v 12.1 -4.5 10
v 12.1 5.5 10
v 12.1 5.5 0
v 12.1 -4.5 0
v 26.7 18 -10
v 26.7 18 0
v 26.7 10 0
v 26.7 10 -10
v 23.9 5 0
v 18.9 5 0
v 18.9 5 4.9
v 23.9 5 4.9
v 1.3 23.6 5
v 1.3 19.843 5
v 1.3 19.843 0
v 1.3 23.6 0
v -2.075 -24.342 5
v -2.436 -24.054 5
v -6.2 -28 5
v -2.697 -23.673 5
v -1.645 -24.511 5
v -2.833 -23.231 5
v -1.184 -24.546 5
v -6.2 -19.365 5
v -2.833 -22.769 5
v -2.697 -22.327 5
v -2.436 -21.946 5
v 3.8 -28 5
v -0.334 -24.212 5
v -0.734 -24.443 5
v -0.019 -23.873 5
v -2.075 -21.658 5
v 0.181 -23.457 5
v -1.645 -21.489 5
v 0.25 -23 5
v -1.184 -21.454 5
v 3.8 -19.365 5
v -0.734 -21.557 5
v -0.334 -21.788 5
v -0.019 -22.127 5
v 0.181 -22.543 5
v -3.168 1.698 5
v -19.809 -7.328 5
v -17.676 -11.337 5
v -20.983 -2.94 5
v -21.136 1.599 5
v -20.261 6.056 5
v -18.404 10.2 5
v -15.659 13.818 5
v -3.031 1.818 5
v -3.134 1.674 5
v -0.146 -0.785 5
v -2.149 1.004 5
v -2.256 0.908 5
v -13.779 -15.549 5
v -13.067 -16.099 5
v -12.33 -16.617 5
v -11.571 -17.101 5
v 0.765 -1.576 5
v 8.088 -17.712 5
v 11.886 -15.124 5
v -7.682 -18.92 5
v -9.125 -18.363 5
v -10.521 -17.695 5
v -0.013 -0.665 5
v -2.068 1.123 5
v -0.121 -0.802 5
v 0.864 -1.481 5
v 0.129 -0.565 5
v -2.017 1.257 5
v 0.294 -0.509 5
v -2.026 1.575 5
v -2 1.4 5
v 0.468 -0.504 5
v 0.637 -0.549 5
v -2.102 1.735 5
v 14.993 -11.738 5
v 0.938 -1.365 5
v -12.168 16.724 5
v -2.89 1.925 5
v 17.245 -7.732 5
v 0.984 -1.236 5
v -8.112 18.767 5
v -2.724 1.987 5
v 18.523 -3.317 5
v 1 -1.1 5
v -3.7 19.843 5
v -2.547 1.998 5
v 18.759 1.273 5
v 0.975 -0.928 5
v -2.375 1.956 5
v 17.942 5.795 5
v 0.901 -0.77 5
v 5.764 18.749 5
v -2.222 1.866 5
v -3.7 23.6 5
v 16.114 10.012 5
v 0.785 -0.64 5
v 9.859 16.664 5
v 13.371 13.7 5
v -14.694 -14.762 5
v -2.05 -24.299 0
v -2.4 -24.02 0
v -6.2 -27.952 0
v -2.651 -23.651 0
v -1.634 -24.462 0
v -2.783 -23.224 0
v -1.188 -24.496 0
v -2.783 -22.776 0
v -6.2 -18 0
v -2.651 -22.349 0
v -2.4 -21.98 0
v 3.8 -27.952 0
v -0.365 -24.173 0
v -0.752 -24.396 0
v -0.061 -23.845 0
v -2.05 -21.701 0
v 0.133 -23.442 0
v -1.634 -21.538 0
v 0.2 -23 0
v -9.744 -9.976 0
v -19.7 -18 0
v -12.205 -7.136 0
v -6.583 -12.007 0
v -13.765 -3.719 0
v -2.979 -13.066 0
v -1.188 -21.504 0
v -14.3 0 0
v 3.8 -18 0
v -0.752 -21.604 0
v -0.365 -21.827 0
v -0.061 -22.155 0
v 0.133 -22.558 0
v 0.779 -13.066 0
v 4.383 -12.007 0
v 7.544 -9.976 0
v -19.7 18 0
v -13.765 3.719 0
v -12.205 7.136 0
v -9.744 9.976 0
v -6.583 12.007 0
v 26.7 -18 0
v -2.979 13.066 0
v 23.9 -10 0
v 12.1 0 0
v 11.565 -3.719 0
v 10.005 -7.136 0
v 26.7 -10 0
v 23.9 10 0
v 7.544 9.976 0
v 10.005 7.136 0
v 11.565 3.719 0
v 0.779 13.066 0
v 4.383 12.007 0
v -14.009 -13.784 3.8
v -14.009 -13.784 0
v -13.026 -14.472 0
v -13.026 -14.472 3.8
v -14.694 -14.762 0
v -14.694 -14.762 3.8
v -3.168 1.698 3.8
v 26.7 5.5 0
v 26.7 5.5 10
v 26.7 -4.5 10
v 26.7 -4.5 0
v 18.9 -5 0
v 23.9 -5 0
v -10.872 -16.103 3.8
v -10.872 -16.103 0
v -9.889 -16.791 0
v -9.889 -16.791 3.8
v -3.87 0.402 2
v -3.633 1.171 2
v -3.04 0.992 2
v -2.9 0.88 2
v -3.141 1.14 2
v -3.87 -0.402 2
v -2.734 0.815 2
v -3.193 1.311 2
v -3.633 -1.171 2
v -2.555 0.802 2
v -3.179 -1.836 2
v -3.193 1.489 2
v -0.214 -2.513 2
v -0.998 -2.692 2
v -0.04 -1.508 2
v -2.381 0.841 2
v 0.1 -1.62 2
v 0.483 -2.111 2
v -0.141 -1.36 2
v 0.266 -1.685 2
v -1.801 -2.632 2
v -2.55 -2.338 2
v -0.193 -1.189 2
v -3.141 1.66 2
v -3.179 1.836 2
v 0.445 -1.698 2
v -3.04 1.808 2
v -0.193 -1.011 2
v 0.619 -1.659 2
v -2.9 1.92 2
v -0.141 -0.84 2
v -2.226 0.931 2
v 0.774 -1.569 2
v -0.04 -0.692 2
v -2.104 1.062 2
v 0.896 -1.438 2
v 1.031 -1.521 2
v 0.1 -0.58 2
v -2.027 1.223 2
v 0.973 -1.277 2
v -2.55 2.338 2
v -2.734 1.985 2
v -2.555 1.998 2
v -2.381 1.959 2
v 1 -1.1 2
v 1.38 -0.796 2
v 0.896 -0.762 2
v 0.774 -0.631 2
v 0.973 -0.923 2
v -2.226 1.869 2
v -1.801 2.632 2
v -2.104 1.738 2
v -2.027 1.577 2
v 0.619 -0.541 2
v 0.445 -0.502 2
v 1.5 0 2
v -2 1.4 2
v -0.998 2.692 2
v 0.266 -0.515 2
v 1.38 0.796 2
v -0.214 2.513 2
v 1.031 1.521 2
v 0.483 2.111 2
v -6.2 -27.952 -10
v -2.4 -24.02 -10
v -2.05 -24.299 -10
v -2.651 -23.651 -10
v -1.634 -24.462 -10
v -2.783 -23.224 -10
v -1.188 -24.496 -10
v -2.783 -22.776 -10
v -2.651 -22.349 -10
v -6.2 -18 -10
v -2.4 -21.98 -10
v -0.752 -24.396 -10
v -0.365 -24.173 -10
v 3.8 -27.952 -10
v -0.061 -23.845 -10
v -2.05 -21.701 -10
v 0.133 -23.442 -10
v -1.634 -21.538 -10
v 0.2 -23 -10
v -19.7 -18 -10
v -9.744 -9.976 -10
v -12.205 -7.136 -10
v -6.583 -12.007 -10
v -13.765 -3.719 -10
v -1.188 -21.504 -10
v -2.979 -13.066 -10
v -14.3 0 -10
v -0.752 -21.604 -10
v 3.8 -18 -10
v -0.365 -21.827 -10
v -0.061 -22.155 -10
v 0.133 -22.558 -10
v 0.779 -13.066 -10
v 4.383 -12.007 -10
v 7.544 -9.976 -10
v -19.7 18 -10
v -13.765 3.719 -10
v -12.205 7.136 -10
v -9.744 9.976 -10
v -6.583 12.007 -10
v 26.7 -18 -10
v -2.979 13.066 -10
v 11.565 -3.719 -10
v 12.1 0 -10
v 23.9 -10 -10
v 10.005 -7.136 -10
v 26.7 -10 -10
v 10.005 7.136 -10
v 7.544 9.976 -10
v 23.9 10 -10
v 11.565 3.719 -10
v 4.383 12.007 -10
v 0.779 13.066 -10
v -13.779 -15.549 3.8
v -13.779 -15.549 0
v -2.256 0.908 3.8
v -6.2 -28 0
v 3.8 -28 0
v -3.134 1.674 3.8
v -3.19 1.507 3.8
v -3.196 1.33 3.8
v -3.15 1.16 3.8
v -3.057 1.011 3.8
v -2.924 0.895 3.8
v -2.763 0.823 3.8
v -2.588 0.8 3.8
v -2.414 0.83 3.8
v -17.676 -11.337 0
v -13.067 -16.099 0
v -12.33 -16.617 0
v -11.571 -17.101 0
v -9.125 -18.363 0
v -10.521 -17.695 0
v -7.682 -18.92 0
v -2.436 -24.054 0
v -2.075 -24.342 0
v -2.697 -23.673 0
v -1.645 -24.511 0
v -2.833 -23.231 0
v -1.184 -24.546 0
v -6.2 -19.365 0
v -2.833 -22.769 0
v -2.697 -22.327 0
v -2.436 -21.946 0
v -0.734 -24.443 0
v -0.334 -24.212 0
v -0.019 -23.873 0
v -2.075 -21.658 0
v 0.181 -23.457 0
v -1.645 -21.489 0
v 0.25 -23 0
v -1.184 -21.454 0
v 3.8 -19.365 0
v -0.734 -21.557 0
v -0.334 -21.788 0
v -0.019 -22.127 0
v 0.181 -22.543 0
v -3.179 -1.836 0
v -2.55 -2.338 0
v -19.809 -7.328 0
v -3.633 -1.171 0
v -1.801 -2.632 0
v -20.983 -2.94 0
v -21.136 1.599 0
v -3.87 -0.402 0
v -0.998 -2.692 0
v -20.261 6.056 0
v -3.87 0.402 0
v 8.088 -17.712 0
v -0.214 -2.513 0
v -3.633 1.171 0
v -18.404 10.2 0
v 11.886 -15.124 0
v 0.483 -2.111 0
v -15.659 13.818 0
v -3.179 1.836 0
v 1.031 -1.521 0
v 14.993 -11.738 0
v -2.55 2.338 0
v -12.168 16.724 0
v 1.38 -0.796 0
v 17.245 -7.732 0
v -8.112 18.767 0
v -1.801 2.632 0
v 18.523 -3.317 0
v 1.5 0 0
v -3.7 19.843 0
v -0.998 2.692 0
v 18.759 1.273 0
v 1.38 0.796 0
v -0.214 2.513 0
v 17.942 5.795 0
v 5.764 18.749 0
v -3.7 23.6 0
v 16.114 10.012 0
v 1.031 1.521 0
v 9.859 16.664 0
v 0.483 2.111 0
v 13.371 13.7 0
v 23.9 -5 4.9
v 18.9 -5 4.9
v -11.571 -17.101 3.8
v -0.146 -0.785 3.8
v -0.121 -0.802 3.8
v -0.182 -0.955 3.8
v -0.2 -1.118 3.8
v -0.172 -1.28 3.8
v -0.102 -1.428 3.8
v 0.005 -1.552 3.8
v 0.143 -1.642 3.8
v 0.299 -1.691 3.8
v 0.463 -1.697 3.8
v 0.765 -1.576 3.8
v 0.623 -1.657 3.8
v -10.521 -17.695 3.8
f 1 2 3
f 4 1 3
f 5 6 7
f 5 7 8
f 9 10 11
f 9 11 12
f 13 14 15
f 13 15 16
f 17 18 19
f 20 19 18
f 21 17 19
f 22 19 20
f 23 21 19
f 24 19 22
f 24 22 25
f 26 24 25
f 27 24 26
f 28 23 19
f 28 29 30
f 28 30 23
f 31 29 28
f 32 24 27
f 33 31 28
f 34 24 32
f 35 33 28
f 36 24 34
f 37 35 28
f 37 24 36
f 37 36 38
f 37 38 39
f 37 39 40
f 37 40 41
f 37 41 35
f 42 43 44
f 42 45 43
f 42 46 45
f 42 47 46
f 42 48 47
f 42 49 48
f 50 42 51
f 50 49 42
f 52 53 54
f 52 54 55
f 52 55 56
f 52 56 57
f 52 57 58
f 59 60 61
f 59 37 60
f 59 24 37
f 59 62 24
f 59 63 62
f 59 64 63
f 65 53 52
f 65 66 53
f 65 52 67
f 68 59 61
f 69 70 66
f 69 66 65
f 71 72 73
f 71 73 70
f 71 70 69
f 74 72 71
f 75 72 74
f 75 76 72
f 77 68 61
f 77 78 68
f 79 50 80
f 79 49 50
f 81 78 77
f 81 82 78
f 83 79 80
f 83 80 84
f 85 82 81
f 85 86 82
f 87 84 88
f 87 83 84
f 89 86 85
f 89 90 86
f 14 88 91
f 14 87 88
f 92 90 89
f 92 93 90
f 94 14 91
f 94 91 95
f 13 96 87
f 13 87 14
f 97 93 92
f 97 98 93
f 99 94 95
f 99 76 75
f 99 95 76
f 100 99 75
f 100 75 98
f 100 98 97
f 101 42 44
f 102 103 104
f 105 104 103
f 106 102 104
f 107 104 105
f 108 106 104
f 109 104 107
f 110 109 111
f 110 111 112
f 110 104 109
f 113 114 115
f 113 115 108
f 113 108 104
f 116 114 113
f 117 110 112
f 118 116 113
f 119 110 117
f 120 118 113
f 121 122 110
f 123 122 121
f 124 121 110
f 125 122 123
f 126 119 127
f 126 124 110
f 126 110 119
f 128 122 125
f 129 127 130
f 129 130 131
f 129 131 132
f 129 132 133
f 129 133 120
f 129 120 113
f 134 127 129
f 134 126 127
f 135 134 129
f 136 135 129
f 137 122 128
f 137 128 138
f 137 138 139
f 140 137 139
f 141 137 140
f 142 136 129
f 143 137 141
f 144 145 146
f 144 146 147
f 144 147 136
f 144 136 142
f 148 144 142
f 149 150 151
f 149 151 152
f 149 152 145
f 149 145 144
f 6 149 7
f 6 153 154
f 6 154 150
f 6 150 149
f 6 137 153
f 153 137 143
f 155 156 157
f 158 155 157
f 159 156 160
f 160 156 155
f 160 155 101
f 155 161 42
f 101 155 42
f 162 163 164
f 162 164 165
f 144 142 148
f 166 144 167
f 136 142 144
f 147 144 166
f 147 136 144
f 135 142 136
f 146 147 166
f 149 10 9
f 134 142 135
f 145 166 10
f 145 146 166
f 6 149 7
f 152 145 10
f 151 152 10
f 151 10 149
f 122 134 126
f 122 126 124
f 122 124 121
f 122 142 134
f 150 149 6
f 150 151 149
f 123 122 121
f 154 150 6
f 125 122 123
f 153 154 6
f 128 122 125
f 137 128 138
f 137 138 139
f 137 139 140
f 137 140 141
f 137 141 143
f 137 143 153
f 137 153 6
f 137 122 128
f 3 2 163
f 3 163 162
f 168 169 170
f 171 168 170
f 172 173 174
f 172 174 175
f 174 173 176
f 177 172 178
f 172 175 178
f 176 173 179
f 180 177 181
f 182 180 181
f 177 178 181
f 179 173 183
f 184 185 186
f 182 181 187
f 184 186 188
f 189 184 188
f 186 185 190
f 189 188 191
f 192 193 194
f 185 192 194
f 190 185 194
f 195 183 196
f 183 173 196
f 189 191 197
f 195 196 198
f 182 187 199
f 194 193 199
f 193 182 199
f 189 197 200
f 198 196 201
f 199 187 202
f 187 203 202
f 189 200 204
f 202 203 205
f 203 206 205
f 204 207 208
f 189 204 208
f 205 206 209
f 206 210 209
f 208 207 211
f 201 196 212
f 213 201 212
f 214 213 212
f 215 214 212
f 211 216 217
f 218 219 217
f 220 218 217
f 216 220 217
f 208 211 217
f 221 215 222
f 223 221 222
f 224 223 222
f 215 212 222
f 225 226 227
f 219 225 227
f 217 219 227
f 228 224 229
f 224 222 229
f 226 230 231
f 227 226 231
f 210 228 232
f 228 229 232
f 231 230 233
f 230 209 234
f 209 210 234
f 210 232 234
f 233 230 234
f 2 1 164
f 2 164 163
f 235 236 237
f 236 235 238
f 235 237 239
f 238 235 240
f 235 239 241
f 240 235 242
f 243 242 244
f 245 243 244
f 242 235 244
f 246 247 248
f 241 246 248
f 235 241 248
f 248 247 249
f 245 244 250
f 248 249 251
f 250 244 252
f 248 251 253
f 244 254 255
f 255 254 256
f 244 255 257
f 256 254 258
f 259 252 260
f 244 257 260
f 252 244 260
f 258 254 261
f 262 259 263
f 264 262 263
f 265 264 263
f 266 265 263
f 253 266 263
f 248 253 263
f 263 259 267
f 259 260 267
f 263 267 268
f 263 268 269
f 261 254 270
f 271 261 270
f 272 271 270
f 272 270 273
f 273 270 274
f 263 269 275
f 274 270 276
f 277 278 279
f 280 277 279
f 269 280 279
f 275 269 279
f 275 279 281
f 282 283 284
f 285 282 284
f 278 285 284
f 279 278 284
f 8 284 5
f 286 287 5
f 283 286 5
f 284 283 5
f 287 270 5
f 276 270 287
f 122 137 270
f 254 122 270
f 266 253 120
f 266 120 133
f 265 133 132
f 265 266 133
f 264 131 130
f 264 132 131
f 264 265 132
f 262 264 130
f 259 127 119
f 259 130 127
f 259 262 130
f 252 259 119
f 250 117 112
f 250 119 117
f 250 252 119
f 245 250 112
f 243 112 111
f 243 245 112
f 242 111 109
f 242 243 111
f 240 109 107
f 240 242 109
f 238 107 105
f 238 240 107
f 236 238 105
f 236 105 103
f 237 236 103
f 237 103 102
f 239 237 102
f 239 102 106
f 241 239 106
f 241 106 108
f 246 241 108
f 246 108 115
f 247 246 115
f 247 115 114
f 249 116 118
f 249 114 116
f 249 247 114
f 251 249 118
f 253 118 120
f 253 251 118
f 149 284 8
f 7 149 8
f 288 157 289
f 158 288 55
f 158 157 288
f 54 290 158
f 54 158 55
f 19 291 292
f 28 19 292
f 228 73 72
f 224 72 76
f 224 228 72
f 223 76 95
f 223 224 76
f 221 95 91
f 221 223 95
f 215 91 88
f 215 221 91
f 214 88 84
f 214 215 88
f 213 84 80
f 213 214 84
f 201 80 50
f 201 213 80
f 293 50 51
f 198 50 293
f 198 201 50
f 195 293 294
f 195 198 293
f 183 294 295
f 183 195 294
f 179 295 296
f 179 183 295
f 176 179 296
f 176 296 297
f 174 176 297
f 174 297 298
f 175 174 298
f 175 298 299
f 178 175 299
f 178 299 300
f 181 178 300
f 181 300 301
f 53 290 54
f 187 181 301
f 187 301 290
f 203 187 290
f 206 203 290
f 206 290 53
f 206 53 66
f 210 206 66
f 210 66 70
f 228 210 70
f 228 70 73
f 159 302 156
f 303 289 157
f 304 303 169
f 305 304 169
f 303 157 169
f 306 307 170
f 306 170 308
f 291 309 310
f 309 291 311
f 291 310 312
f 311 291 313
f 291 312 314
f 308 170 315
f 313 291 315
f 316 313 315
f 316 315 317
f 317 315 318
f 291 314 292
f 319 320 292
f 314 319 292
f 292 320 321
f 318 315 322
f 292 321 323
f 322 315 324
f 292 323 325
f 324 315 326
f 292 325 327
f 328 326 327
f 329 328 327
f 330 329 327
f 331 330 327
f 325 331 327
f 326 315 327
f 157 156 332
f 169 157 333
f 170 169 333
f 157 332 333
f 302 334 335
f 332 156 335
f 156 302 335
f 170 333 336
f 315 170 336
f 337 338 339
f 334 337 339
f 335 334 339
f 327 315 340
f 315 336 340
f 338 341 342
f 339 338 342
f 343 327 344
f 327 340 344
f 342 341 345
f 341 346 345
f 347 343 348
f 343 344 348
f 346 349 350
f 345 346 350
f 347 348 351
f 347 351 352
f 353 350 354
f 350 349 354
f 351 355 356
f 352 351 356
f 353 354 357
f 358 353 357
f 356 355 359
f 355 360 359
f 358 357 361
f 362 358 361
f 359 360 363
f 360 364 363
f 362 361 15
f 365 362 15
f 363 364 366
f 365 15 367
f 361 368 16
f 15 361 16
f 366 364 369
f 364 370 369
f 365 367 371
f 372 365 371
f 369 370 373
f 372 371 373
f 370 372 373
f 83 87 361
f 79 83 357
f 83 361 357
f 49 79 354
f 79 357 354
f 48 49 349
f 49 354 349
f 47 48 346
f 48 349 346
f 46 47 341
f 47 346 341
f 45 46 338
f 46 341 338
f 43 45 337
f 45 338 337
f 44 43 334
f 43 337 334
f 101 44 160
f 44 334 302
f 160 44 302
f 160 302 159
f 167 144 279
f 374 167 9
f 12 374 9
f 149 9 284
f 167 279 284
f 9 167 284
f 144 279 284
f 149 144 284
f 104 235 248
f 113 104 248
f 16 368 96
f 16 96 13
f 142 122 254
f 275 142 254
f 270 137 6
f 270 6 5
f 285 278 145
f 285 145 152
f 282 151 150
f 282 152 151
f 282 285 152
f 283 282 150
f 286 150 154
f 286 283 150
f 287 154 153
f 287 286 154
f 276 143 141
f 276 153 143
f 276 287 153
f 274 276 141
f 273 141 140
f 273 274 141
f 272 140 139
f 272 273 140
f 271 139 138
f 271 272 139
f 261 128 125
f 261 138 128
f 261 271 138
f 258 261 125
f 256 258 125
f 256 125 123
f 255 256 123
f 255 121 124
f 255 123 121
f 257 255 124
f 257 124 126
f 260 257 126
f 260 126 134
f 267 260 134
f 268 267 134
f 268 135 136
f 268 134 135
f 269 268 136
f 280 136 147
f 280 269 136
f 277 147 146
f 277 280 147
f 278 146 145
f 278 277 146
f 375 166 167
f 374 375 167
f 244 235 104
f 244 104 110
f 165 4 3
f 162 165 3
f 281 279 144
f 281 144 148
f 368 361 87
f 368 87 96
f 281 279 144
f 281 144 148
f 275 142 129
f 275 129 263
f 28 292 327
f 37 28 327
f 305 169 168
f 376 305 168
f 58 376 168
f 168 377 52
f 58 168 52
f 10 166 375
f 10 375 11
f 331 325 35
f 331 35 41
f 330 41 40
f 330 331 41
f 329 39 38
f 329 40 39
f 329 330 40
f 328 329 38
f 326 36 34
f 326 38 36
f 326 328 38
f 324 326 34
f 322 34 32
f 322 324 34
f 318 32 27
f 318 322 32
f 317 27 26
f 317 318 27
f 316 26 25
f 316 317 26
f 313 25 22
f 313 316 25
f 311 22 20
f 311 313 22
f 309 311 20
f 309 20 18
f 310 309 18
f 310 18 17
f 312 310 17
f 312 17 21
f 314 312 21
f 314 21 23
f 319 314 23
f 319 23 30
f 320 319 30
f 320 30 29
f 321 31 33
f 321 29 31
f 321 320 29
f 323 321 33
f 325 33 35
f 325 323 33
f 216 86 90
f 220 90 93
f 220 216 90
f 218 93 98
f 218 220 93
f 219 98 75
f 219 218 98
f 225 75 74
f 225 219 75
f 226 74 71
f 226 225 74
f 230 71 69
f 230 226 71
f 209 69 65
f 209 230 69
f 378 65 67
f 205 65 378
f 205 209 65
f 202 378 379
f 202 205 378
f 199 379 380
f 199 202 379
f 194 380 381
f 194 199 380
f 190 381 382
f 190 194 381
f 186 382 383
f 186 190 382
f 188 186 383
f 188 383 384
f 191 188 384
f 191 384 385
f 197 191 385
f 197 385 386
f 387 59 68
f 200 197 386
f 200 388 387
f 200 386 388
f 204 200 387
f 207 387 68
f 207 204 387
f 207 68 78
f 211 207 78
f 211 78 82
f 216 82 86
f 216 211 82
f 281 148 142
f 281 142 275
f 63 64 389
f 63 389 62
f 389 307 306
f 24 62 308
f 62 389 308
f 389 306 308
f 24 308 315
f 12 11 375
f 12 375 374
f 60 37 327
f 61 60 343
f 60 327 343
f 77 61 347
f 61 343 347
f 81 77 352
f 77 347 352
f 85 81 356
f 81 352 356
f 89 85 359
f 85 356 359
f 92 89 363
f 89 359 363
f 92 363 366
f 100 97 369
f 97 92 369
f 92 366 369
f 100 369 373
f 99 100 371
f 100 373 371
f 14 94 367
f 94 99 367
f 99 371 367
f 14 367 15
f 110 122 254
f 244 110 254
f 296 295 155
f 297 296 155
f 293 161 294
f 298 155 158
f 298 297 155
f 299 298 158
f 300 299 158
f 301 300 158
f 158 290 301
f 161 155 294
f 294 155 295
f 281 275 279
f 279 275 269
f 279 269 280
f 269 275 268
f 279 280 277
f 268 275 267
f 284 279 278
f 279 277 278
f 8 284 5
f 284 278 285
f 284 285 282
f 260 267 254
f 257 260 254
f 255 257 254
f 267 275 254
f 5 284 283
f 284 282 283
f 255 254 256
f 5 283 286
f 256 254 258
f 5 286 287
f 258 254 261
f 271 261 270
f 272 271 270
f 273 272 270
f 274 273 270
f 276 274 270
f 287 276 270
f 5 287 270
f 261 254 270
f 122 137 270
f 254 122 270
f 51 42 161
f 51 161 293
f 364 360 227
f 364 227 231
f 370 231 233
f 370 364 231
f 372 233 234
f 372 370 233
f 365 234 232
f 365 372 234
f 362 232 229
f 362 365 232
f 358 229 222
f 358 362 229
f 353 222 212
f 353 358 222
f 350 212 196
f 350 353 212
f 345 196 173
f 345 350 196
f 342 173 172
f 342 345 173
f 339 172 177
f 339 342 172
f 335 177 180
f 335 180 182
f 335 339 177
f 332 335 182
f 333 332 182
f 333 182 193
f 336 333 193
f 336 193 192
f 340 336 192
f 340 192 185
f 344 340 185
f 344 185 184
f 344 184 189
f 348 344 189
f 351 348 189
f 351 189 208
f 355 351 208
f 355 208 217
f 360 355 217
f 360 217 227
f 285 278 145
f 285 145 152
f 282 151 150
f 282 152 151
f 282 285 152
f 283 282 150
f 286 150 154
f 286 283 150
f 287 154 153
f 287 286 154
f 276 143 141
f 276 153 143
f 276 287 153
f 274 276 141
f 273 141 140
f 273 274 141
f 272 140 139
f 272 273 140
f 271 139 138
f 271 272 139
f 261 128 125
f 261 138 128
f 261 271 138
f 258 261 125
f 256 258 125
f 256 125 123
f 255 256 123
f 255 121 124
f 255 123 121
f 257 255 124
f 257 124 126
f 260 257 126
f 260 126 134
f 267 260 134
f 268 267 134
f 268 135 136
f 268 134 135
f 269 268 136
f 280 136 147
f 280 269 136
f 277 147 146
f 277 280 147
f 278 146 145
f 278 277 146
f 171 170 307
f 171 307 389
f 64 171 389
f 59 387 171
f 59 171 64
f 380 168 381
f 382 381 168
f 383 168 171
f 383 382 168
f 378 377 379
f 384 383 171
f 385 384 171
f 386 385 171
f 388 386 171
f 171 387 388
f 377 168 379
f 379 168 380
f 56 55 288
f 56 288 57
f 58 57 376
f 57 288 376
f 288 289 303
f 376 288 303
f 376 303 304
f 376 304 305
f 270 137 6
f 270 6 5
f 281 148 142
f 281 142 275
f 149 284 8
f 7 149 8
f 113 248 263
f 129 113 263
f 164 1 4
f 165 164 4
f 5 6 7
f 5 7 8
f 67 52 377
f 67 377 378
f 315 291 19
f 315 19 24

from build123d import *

# Parameters (mm, degrees)
BOX001_W               = 10
BOX001_H               = 10
BOX001_DEPTH           = 14.6
CYLINDER001_R          = 1.5
CYLINDER001_DEPTH      = 30
BOX002_W               = 10
BOX002_H               = 10
BOX002_DEPTH           = 10
BOX005_W               = 10
BOX005_H               = 20
BOX005_DEPTH           = 20
CYLINDER_R             = 13.2
CYLINDER_DEPTH         = 40
BOX_W                  = 10
BOX_H                  = 36
BOX_DEPTH              = 46.4
BOX004_W               = 5
BOX004_H               = 10
BOX004_DEPTH           = 5
BOX006_W               = 5
BOX006_H               = 5
BOX006_DEPTH           = 5
CYLINDER003_R          = 1.55
CYLINDER003_DEPTH      = 50
BOX003_W               = 10
BOX003_H               = 14
BOX003_DEPTH           = 5
BOX010_W               = 1.2
BOX010_H               = 30
BOX010_DEPTH           = 10
BOX010_ROLL_ANGLE      = 90
BOX010_PLACEMENT_ANGLE = -35
BOX009_W               = 1.2
BOX009_H               = 30
BOX009_DEPTH           = 10
BOX009_ROLL_ANGLE      = 90
BOX009_PLACEMENT_ANGLE = -35
BOX008_W               = 1.2
BOX008_H               = 30
BOX008_DEPTH           = 10
BOX008_PLACEMENT_ANGLE = 325
BOX007_W               = 1.2
BOX007_H               = 30
BOX007_DEPTH           = 10
BOX007_PLACEMENT_ANGLE = 325
CYLINDER006_R          = 0.6
CYLINDER006_DEPTH      = 30
CYLINDER005_R          = 0.6
CYLINDER005_DEPTH      = 30
CYLINDER004_R          = 2.7
CYLINDER004_DEPTH      = 10
CYLINDER002_R          = 20
CYLINDER002_DEPTH      = 5


with BuildPart() as cube001:
    # Box001 → Box001 (new body)
    with BuildSketch(Plane(origin=(12.1, -4.5, 10), x_dir=(0, 0, -1), z_dir=(1, 0, 0))):
        with Locations((5, 5)):
            Rectangle(BOX001_W, BOX001_H)
    extrude(amount=BOX001_DEPTH)


with BuildPart() as hingetabhole:
    # Cylinder001 → Cylinder001 (new body)
    with BuildSketch(Plane(origin=(-1.3, -23, -12), x_dir=(1, 0, 0), z_dir=(0, 0, 1))):
        Circle(CYLINDER001_R)
    extrude(amount=CYLINDER001_DEPTH)


with BuildPart() as mainpiecehingetab:
    # Box002 → Box002 (new body)
    with BuildSketch(Plane(origin=(-6.2, -27.952, -10), x_dir=(1, 0, 0), z_dir=(0, 0, 1))):
        with Locations((5, 5)):
            Rectangle(BOX002_W, BOX002_H)
    extrude(amount=BOX002_DEPTH)

    # Cut010: cut hingeTabHole
    add(hingetabhole.part, mode=Mode.SUBTRACT)


with BuildPart() as footcutout:
    # Box005 → Box005 (new body)
    with BuildSketch(Plane(origin=(23.9, -10, -18), x_dir=(1, 0, 0), z_dir=(0, 0, 1))):
        with Locations((5, 10)):
            Rectangle(BOX005_W, BOX005_H)
    extrude(amount=BOX005_DEPTH)


with BuildPart() as cardboardbarrelholder:
    # Cylinder → Cylinder (new body)
    with BuildSketch(Plane(origin=(-1.1, 0, -20), x_dir=(1, 0, 0), z_dir=(0, 0, 1))):
        Circle(CYLINDER_R)
    extrude(amount=CYLINDER_DEPTH)


with BuildPart() as mainpiece1:
    # Box → Box (new body)
    with BuildSketch(Plane(origin=(-19.7, -18, 0), x_dir=(0, 0, -1), z_dir=(1, 0, 0))):
        with Locations((5, 18)):
            Rectangle(BOX_W, BOX_H)
    extrude(amount=BOX_DEPTH)

    # Cut: cut cardboardBarrelHolder
    add(cardboardbarrelholder.part, mode=Mode.SUBTRACT)

    # Cut001: cut footCutout
    add(footcutout.part, mode=Mode.SUBTRACT)


with BuildPart() as mainpiece2:
    # Fusion base: copy of mainPiece1
    add(mainpiece1.part)

    # Fusion: union mainPieceHingeTab
    add(mainpiecehingetab.part)


with BuildPart() as swivelstop:
    # Box004 → Box004 (new body)
    with BuildSketch(Plane(origin=(18.9, -5, -0.1), x_dir=(1, 0, 0), z_dir=(0, 0, 1))):
        with Locations((2.5, 5)):
            Rectangle(BOX004_W, BOX004_H)
    extrude(amount=BOX004_DEPTH)


with BuildPart() as mainpiece3:
    # Fusion002 base: copy of mainPiece1
    add(mainpiece1.part)

    # Fusion002: union swivelStop
    add(swivelstop.part)


with BuildPart() as shuttermovetab:
    # Box006 → Box006 (new body)
    with BuildSketch(Plane(origin=(-3.7, 18.6, 0), x_dir=(1, 0, 0), z_dir=(0, 0, 1))):
        with Locations((2.5, 2.5)):
            Rectangle(BOX006_W, BOX006_H)
    extrude(amount=BOX006_DEPTH)


with BuildPart() as shuttertabhole:
    # Cylinder003 → Cylinder003 (new body)
    with BuildSketch(Plane(origin=(-1.3, -23, -12), x_dir=(1, 0, 0), z_dir=(0, 0, 1))):
        Circle(CYLINDER003_R)
    extrude(amount=CYLINDER003_DEPTH)


with BuildPart() as shutterhingetab001:
    # Box003 → Box003 (new body)
    with BuildSketch(Plane(origin=(-6.2, -28, 0), x_dir=(1, 0, 0), z_dir=(0, 0, 1))):
        with Locations((5, 7)):
            Rectangle(BOX003_W, BOX003_H)
    extrude(amount=BOX003_DEPTH)

    # Cut009: cut shutterTabHole
    add(shuttertabhole.part, mode=Mode.SUBTRACT)


with BuildPart() as radialtransit4:
    # Box010 → Box010 (new body)
    with BuildSketch(Plane.XY):
        with Locations((0.6, 15)):
            Rectangle(BOX010_W, BOX010_H)
    extrude(amount=BOX010_DEPTH)


with BuildPart() as radialtransit4_1:
    # Box010 roll: moved
    add(radialtransit4.part.rotate(Axis((0, 0, 0), (1, 0, 0)), BOX010_ROLL_ANGLE))


with BuildPart() as radialtransit4_2:
    # Box010 placement: moved
    add(radialtransit4_1.part.moved(Location((-14.008889, -13.784169, -4.1))).rotate(Axis((-14.008889, -13.784169, -4.1), (0, 0, 1)), BOX010_PLACEMENT_ANGLE))


with BuildPart() as radialtransit3:
    # Box009 → Box009 (new body)
    with BuildSketch(Plane.XY):
        with Locations((0.6, 15)):
            Rectangle(BOX009_W, BOX009_H)
    extrude(amount=BOX009_DEPTH)


with BuildPart() as radialtransit3_1:
    # Box009 roll: moved
    add(radialtransit3.part.rotate(Axis((0, 0, 0), (1, 0, 0)), BOX009_ROLL_ANGLE))


with BuildPart() as radialtransit3_2:
    # Box009 placement: moved
    add(radialtransit3_1.part.moved(Location((-10.871554, -16.103032, -4.1))).rotate(Axis((-10.871554, -16.103032, -4.1), (0, 0, 1)), BOX009_PLACEMENT_ANGLE))


with BuildPart() as radialtransit2:
    # Box008 → Box008 (new body)
    with BuildSketch(Plane.XY):
        with Locations((0.6, 15)):
            Rectangle(BOX008_W, BOX008_H)
    extrude(amount=BOX008_DEPTH)


with BuildPart() as radialtransit2_1:
    # Box008 placement: moved
    add(radialtransit2.part.moved(Location((-20.375588, -22.876757, 3.8))).rotate(Axis((-20.375588, -22.876757, 3.8), (0, 0, 1)), BOX008_PLACEMENT_ANGLE))


with BuildPart() as radialtransit1:
    # Box007 → Box007 (new body)
    with BuildSketch(Plane.XY):
        with Locations((0.6, 15)):
            Rectangle(BOX007_W, BOX007_H)
    extrude(amount=BOX007_DEPTH)


with BuildPart() as radialtransit1_1:
    # Box007 placement: moved
    add(radialtransit1.part.moved(Location((-17.352968, -25.35945, 3.8))).rotate(Axis((-17.352968, -25.35945, 3.8), (0, 0, 1)), BOX007_PLACEMENT_ANGLE))


with BuildPart() as cdswire2:
    # Cylinder006 → Cylinder006 (new body)
    with BuildSketch(Plane(origin=(-2.6, 1.4, -18), x_dir=(1, 0, 0), z_dir=(0, 0, 1))):
        Circle(CYLINDER006_R)
    extrude(amount=CYLINDER006_DEPTH)


with BuildPart() as cdswire1:
    # Cylinder005 → Cylinder005 (new body)
    with BuildSketch(Plane(origin=(0.4, -1.1, -18), x_dir=(1, 0, 0), z_dir=(0, 0, 1))):
        Circle(CYLINDER005_R)
    extrude(amount=CYLINDER005_DEPTH)


with BuildPart() as cdsdivot:
    # Cylinder004 → Cylinder004 (new body)
    with BuildSketch(Plane(origin=(-1.2, 0, -8), x_dir=(1, 0, 0), z_dir=(0, 0, 1))):
        Circle(CYLINDER004_R)
    extrude(amount=CYLINDER004_DEPTH)


with BuildPart() as shutter4:
    # Cylinder002 → Cylinder002 (new body)
    with BuildSketch(Plane(origin=(-1.2, 0, 0), x_dir=(1, 0, 0), z_dir=(0, 0, 1))):
        Circle(CYLINDER002_R)
    extrude(amount=CYLINDER002_DEPTH)

    # Cut002: cut CdSDivot
    add(cdsdivot.part, mode=Mode.SUBTRACT)

    # Cut003: cut CdSWire1
    add(cdswire1.part, mode=Mode.SUBTRACT)

    # Cut004: cut CdsWire2
    add(cdswire2.part, mode=Mode.SUBTRACT)

    # Cut005: cut radialTransit1
    add(radialtransit1_1.part, mode=Mode.SUBTRACT)

    # Cut006: cut radialTransit2
    add(radialtransit2_1.part, mode=Mode.SUBTRACT)

    # Cut007: cut radialTransit3
    add(radialtransit3_2.part, mode=Mode.SUBTRACT)

    # Cut008: cut radialTransit4
    add(radialtransit4_2.part, mode=Mode.SUBTRACT)

    # Fusion001: union shutterHingeTab001
    add(shutterhingetab001.part)

    # Fusion003: union shutterMoveTab
    add(shuttermovetab.part)


solid = Compound([cube001.part, mainpiece2.part, mainpiece3.part, shutter4.part])
